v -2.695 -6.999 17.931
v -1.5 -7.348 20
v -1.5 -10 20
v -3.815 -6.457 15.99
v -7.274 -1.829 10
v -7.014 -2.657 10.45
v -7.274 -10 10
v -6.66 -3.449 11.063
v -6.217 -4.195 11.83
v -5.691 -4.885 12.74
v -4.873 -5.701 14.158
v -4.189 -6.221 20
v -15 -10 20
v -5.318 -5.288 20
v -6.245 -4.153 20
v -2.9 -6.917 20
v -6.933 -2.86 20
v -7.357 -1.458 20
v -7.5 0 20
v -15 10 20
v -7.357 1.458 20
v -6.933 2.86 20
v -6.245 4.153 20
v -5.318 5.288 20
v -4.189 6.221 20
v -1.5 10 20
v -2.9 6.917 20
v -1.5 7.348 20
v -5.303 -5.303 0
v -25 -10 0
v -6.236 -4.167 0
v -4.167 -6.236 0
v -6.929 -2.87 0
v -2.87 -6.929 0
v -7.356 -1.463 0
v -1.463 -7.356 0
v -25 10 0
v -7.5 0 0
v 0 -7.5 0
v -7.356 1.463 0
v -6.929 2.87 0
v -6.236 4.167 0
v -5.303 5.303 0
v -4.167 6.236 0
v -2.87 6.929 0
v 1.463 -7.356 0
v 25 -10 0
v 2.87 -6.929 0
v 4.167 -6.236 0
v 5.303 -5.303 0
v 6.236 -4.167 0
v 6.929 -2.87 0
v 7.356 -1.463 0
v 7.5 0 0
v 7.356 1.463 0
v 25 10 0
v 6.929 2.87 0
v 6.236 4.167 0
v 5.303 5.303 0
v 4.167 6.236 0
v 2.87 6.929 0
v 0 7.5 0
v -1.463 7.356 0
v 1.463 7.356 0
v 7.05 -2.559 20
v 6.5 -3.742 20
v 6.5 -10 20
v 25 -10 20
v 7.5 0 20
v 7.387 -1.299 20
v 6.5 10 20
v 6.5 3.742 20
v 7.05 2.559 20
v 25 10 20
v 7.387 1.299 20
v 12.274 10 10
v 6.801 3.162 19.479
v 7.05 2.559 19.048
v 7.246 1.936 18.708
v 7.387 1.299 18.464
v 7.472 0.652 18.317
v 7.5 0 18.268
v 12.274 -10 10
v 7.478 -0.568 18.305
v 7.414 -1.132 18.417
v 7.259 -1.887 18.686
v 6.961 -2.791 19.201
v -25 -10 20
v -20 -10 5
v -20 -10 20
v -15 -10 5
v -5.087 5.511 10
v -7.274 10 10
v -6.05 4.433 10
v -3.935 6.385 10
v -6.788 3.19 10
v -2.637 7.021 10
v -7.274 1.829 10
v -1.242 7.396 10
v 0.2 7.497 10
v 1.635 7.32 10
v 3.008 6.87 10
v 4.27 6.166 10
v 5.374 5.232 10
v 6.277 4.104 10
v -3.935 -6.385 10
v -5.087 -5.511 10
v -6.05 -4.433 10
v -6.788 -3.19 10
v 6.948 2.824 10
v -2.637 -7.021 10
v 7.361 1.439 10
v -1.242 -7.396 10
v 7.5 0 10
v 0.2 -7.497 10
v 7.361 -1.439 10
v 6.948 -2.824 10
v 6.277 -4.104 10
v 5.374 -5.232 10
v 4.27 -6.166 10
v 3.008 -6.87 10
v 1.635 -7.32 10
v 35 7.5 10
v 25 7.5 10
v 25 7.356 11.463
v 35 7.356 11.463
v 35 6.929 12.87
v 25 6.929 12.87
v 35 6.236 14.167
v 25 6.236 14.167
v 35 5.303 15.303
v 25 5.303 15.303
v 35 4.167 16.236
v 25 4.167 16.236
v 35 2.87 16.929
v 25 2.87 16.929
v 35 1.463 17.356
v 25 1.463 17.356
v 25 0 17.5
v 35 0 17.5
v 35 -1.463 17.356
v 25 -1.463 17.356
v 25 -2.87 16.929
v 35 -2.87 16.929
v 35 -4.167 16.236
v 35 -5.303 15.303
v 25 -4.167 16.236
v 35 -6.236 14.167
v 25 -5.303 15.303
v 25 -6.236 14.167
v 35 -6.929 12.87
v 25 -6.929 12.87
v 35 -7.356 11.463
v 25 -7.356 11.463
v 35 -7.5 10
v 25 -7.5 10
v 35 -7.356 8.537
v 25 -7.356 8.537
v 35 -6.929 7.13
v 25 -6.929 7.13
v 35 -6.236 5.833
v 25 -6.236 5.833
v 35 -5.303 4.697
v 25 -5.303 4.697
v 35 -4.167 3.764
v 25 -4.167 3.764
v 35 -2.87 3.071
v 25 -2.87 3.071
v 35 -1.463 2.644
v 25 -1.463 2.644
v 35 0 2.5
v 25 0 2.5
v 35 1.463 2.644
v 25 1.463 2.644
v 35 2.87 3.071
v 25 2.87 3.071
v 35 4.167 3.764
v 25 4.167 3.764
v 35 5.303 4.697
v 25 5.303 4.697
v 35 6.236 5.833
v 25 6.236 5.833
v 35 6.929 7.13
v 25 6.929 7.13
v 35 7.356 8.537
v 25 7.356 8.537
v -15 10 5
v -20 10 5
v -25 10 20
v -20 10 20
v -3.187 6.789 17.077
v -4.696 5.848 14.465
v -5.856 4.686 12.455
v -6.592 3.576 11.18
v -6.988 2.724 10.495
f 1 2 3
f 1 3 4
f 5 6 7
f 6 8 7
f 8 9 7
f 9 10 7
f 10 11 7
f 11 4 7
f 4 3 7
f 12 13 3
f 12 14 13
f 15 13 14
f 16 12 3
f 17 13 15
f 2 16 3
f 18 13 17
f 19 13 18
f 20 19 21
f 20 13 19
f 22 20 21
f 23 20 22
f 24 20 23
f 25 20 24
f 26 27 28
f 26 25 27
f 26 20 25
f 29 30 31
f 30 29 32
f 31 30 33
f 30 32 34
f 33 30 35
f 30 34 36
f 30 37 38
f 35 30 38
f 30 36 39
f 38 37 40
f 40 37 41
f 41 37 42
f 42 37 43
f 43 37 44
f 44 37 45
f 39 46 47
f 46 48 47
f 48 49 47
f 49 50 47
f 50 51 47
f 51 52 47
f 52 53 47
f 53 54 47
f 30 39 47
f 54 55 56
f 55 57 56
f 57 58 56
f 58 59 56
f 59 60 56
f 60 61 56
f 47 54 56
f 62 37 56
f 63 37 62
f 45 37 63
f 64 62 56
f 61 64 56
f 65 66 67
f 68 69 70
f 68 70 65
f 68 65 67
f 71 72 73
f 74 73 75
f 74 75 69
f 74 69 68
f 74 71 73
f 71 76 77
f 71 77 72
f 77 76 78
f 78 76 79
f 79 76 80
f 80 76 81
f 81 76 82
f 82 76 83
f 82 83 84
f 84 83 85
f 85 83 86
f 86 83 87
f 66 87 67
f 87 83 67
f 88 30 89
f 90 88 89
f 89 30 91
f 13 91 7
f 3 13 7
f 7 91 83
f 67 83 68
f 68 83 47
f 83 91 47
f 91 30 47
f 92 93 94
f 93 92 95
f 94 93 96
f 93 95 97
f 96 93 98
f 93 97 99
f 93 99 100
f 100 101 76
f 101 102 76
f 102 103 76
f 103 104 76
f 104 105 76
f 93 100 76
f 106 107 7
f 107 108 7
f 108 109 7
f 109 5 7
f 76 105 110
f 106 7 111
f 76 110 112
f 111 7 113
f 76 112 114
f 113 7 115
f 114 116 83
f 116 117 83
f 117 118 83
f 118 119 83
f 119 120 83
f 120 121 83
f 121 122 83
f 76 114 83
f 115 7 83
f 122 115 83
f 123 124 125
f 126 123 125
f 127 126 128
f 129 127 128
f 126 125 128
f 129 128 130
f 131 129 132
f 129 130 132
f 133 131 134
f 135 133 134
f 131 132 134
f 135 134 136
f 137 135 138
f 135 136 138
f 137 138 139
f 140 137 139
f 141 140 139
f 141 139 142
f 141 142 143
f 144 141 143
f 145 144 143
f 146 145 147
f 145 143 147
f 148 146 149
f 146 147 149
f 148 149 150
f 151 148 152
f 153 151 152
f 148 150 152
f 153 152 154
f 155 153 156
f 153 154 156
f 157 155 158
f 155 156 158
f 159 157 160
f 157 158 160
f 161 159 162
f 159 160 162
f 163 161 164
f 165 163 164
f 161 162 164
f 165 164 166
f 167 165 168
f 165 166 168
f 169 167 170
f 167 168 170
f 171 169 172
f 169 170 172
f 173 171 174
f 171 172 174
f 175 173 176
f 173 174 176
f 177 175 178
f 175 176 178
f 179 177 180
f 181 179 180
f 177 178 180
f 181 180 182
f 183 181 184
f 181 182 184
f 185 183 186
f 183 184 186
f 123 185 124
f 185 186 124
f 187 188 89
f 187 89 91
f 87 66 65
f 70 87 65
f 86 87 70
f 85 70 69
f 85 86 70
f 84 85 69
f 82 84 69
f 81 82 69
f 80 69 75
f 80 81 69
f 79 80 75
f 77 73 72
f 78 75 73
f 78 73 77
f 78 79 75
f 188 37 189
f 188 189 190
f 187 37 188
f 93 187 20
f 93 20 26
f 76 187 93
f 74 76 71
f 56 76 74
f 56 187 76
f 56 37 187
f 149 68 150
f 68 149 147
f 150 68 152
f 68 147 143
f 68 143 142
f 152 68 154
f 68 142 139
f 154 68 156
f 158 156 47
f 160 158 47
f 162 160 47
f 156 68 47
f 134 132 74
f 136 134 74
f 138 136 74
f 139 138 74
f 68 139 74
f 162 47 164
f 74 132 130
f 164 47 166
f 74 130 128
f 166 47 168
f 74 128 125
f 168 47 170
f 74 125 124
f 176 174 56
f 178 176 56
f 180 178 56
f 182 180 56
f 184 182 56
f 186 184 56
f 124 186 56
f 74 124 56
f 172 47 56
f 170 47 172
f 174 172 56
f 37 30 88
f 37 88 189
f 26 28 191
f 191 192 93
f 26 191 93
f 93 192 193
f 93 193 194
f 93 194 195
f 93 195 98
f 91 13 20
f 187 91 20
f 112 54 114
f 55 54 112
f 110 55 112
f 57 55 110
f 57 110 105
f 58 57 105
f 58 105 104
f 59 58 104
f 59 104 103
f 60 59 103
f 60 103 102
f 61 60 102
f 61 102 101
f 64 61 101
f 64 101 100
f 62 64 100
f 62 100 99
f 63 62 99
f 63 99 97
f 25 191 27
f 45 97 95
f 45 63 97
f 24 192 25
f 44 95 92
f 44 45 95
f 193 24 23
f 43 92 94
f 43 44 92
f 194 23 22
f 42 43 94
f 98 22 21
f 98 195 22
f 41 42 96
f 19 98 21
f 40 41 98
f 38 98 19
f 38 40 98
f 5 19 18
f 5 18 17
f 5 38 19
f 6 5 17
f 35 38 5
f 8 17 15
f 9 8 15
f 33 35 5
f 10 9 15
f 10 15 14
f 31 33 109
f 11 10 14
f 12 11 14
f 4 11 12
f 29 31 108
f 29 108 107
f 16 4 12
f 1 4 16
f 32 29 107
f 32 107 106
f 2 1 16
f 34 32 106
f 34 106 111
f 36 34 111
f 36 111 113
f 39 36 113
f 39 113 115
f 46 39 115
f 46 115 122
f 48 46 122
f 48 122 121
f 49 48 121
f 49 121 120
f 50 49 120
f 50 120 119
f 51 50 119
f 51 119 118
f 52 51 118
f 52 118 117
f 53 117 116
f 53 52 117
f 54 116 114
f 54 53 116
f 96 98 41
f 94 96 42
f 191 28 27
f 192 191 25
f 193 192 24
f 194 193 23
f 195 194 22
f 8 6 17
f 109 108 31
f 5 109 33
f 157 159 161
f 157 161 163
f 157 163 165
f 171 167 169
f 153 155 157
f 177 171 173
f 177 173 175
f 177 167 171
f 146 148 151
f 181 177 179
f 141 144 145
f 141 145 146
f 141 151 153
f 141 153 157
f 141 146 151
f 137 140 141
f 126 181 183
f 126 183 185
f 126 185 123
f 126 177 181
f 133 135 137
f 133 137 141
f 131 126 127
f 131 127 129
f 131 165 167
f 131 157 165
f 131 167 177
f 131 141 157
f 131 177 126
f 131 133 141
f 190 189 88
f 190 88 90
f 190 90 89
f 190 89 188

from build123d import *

# Parameters (mm, degrees)
F0_W     = 50
F0_H     = 20
F0_R     = 7.5
F1_DEPTH = 20
F2_W     = 5
F2_H     = 20
F3_DEPTH = 15
F5_DEPTH = 20.001
F6_R     = 7.5
F7_DEPTH = 10


with BuildPart() as f1:
    # F0 (on Top) → F1 (new body)
    with BuildSketch(Plane.XY):
        Rectangle(F0_W, F0_H)
        Circle(F0_R, mode=Mode.SUBTRACT)
    extrude(amount=F1_DEPTH)

    # F2 (on face) → F3 (cut)
    with BuildSketch(Plane.XY.offset(20)):
        with Locations((-17.5, 0)):
            Rectangle(F2_W, F2_H)
    extrude(amount=-F3_DEPTH, mode=Mode.SUBTRACT)

    # F4 (on face) → F5 (cut, through all)
    with BuildSketch(Plane.XZ.offset(10)):
        Polygon((6.5, 20), (-1.5, 20), (-7.273503, 10), (12.273503, 10), align=None)
    extrude(amount=-F5_DEPTH, mode=Mode.SUBTRACT)

    # F6 (on face) → F7 (join)
    with BuildSketch(Plane.YZ.offset(25)):
        with Locations((0, 10)):
            Circle(F6_R)
    extrude(amount=F7_DEPTH)


solid = f1.part
